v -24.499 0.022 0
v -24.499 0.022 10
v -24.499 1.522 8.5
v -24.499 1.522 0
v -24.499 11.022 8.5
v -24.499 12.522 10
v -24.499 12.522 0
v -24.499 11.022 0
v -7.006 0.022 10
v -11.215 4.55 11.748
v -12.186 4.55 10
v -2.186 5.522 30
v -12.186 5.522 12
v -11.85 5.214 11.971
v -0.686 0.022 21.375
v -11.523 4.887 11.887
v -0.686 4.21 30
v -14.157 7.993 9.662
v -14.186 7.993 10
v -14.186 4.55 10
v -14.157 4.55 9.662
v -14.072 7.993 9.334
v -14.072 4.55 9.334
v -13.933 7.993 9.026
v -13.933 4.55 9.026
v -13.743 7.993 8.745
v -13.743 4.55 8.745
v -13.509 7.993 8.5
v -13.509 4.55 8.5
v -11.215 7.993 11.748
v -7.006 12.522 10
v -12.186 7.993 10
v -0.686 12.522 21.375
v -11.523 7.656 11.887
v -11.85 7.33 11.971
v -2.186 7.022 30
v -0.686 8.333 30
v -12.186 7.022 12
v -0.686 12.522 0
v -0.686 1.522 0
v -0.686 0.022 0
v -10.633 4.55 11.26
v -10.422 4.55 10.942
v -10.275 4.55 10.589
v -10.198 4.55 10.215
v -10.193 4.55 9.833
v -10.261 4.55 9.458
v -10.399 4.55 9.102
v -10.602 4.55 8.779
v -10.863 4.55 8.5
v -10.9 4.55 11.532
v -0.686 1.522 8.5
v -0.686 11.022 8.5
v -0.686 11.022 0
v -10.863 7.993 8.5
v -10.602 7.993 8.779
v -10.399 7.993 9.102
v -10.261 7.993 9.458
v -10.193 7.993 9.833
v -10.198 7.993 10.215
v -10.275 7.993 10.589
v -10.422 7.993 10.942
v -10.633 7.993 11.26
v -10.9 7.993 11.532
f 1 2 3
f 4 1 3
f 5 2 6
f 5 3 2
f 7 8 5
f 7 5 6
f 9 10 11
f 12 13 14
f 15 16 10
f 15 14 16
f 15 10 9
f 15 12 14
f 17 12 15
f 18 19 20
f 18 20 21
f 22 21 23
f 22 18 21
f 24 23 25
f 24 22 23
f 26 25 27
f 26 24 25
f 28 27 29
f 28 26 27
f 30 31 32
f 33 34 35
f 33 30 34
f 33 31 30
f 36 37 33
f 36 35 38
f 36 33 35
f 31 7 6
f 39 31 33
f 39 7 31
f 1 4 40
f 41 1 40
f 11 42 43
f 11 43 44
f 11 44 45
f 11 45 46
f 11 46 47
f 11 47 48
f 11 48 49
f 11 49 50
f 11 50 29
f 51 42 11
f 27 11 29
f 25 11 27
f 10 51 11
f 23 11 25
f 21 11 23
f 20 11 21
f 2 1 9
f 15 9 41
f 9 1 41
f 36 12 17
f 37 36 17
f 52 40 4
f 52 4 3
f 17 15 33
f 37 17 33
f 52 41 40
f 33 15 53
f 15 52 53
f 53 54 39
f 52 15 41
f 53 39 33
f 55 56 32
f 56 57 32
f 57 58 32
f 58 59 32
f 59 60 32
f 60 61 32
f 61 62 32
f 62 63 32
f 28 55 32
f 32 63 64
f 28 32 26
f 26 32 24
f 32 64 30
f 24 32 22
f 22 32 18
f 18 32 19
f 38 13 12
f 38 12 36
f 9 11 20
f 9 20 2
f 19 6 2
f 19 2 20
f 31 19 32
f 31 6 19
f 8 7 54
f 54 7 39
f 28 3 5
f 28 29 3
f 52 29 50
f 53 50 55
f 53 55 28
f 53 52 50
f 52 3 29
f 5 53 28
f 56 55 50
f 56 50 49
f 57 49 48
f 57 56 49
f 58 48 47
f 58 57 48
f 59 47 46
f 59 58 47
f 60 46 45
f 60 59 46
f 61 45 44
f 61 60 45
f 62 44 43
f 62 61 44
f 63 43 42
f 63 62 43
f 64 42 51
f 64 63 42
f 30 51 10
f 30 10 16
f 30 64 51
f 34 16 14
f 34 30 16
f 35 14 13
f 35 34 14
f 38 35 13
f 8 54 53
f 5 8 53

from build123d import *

# Parameters (mm, degrees)
F0_W        = 23.8125
F0_H        = 12.5
F1_DEPTH    = 10
F2_W        = 9.5
F2_H        = 8.5
F3_DEPTH    = 23.8135
F4_W        = 11.5
F4_H        = 12.5
F5_DEPTH    = 20
F6_SIZE2    = 18
F6_SIZE     = 10
F7_T4_DEPTH = 48.8797731496
F7_T9_DEPTH = 48.8797731496
F8_W        = 2
F8_H        = 3.4425717247


# Not quite as in the source:
# - a fillet or chamfer that OpenCascade refuses, or shapes differently, is made with other operations: its cross-section is extruded or revolved along the edge and cut away or added


with BuildPart() as f1:
    # F0 (on Top) → F1 (new body)
    with BuildSketch(Plane.XY):
        with Locations((-12.5924281826, 6.2716105528)):
            Rectangle(F0_W, F0_H)
    extrude(amount=F1_DEPTH)

    # F2 (on face) → F3 (cut, through all)
    with BuildSketch(Plane.YZ.offset(-0.6861781826)):
        with Locations((6.2716105528, 4.25)):
            Rectangle(F2_W, F2_H)
    extrude(amount=-F3_DEPTH, mode=Mode.SUBTRACT)

    # F4 (on face) → F5 (join)
    with BuildSketch(Plane.XY.offset(10)):
        with Locations((-6.4361781826, 6.2716105528)):
            Rectangle(F4_W, F4_H)
    extrude(amount=F5_DEPTH)

    # F6
    f6_edges = [f1.edges().sort_by_distance(p)[0] for p in [
        (-12.186178, 6.271611, 30),
    ]]
    f6_side = f1.faces().sort_by_distance((-6.436178, 6.271611, 30))[0]
    chamfer(f6_edges, length=F6_SIZE, length2=F6_SIZE2, reference=f6_side)

    # F7: chamfer of 5.5 on 2 edges, made by hand


with BuildPart() as f7_tool2:
    # F7_s3 → F7_t4 (new body)
    with BuildSketch(Plane(origin=(19.0892991485, 0, 34.3607384673), x_dir=(0, 1, 0), z_dir=(-0.4856429312, 0, -0.8741572761))):
        Polygon((12.5216105528, -10.9803515006), (7.0216105528, -16.4803515006), (12.5216105528, -16.4803515006), align=None)
    extrude(amount=F7_T4_DEPTH)

    split(bisect_by=Plane.XY.offset(10), keep=Keep.TOP)


with BuildPart() as f1_1:
    add(f1.part)

    # F7_t1: cut F7_tool2
    add(f7_tool2.part, mode=Mode.SUBTRACT)


with BuildPart() as f7_tool7:
    # F7_s8 → F7_t9 (new body)
    with BuildSketch(Plane(origin=(19.0892991485, 0, 34.3607384673), x_dir=(0, 1, 0), z_dir=(-0.4856429312, 0, -0.8741572761))):
        Polygon((5.5216105528, -16.4803515006), (0.0216105528, -10.9803515006), (0.0216105528, -16.4803515006), align=None)
    extrude(amount=F7_T9_DEPTH)

    split(bisect_by=Plane.XY.offset(10), keep=Keep.TOP)


with BuildPart() as f1_2:
    add(f1_1.part)

    # F7_t6: cut F7_tool7
    add(f7_tool7.part, mode=Mode.SUBTRACT)

    # F8 (on face) → F9 (revolve, cut)
    with BuildSketch(Plane.XY.offset(10)):
        with Locations((-11.1861781826, 6.2716105528)):
            Rectangle(F8_W, F8_H)
    revolve(axis=Axis((-12.1861781826, 6.2716105528, 10), (0, -1, 0)), mode=Mode.SUBTRACT)


solid = f1_2.part
